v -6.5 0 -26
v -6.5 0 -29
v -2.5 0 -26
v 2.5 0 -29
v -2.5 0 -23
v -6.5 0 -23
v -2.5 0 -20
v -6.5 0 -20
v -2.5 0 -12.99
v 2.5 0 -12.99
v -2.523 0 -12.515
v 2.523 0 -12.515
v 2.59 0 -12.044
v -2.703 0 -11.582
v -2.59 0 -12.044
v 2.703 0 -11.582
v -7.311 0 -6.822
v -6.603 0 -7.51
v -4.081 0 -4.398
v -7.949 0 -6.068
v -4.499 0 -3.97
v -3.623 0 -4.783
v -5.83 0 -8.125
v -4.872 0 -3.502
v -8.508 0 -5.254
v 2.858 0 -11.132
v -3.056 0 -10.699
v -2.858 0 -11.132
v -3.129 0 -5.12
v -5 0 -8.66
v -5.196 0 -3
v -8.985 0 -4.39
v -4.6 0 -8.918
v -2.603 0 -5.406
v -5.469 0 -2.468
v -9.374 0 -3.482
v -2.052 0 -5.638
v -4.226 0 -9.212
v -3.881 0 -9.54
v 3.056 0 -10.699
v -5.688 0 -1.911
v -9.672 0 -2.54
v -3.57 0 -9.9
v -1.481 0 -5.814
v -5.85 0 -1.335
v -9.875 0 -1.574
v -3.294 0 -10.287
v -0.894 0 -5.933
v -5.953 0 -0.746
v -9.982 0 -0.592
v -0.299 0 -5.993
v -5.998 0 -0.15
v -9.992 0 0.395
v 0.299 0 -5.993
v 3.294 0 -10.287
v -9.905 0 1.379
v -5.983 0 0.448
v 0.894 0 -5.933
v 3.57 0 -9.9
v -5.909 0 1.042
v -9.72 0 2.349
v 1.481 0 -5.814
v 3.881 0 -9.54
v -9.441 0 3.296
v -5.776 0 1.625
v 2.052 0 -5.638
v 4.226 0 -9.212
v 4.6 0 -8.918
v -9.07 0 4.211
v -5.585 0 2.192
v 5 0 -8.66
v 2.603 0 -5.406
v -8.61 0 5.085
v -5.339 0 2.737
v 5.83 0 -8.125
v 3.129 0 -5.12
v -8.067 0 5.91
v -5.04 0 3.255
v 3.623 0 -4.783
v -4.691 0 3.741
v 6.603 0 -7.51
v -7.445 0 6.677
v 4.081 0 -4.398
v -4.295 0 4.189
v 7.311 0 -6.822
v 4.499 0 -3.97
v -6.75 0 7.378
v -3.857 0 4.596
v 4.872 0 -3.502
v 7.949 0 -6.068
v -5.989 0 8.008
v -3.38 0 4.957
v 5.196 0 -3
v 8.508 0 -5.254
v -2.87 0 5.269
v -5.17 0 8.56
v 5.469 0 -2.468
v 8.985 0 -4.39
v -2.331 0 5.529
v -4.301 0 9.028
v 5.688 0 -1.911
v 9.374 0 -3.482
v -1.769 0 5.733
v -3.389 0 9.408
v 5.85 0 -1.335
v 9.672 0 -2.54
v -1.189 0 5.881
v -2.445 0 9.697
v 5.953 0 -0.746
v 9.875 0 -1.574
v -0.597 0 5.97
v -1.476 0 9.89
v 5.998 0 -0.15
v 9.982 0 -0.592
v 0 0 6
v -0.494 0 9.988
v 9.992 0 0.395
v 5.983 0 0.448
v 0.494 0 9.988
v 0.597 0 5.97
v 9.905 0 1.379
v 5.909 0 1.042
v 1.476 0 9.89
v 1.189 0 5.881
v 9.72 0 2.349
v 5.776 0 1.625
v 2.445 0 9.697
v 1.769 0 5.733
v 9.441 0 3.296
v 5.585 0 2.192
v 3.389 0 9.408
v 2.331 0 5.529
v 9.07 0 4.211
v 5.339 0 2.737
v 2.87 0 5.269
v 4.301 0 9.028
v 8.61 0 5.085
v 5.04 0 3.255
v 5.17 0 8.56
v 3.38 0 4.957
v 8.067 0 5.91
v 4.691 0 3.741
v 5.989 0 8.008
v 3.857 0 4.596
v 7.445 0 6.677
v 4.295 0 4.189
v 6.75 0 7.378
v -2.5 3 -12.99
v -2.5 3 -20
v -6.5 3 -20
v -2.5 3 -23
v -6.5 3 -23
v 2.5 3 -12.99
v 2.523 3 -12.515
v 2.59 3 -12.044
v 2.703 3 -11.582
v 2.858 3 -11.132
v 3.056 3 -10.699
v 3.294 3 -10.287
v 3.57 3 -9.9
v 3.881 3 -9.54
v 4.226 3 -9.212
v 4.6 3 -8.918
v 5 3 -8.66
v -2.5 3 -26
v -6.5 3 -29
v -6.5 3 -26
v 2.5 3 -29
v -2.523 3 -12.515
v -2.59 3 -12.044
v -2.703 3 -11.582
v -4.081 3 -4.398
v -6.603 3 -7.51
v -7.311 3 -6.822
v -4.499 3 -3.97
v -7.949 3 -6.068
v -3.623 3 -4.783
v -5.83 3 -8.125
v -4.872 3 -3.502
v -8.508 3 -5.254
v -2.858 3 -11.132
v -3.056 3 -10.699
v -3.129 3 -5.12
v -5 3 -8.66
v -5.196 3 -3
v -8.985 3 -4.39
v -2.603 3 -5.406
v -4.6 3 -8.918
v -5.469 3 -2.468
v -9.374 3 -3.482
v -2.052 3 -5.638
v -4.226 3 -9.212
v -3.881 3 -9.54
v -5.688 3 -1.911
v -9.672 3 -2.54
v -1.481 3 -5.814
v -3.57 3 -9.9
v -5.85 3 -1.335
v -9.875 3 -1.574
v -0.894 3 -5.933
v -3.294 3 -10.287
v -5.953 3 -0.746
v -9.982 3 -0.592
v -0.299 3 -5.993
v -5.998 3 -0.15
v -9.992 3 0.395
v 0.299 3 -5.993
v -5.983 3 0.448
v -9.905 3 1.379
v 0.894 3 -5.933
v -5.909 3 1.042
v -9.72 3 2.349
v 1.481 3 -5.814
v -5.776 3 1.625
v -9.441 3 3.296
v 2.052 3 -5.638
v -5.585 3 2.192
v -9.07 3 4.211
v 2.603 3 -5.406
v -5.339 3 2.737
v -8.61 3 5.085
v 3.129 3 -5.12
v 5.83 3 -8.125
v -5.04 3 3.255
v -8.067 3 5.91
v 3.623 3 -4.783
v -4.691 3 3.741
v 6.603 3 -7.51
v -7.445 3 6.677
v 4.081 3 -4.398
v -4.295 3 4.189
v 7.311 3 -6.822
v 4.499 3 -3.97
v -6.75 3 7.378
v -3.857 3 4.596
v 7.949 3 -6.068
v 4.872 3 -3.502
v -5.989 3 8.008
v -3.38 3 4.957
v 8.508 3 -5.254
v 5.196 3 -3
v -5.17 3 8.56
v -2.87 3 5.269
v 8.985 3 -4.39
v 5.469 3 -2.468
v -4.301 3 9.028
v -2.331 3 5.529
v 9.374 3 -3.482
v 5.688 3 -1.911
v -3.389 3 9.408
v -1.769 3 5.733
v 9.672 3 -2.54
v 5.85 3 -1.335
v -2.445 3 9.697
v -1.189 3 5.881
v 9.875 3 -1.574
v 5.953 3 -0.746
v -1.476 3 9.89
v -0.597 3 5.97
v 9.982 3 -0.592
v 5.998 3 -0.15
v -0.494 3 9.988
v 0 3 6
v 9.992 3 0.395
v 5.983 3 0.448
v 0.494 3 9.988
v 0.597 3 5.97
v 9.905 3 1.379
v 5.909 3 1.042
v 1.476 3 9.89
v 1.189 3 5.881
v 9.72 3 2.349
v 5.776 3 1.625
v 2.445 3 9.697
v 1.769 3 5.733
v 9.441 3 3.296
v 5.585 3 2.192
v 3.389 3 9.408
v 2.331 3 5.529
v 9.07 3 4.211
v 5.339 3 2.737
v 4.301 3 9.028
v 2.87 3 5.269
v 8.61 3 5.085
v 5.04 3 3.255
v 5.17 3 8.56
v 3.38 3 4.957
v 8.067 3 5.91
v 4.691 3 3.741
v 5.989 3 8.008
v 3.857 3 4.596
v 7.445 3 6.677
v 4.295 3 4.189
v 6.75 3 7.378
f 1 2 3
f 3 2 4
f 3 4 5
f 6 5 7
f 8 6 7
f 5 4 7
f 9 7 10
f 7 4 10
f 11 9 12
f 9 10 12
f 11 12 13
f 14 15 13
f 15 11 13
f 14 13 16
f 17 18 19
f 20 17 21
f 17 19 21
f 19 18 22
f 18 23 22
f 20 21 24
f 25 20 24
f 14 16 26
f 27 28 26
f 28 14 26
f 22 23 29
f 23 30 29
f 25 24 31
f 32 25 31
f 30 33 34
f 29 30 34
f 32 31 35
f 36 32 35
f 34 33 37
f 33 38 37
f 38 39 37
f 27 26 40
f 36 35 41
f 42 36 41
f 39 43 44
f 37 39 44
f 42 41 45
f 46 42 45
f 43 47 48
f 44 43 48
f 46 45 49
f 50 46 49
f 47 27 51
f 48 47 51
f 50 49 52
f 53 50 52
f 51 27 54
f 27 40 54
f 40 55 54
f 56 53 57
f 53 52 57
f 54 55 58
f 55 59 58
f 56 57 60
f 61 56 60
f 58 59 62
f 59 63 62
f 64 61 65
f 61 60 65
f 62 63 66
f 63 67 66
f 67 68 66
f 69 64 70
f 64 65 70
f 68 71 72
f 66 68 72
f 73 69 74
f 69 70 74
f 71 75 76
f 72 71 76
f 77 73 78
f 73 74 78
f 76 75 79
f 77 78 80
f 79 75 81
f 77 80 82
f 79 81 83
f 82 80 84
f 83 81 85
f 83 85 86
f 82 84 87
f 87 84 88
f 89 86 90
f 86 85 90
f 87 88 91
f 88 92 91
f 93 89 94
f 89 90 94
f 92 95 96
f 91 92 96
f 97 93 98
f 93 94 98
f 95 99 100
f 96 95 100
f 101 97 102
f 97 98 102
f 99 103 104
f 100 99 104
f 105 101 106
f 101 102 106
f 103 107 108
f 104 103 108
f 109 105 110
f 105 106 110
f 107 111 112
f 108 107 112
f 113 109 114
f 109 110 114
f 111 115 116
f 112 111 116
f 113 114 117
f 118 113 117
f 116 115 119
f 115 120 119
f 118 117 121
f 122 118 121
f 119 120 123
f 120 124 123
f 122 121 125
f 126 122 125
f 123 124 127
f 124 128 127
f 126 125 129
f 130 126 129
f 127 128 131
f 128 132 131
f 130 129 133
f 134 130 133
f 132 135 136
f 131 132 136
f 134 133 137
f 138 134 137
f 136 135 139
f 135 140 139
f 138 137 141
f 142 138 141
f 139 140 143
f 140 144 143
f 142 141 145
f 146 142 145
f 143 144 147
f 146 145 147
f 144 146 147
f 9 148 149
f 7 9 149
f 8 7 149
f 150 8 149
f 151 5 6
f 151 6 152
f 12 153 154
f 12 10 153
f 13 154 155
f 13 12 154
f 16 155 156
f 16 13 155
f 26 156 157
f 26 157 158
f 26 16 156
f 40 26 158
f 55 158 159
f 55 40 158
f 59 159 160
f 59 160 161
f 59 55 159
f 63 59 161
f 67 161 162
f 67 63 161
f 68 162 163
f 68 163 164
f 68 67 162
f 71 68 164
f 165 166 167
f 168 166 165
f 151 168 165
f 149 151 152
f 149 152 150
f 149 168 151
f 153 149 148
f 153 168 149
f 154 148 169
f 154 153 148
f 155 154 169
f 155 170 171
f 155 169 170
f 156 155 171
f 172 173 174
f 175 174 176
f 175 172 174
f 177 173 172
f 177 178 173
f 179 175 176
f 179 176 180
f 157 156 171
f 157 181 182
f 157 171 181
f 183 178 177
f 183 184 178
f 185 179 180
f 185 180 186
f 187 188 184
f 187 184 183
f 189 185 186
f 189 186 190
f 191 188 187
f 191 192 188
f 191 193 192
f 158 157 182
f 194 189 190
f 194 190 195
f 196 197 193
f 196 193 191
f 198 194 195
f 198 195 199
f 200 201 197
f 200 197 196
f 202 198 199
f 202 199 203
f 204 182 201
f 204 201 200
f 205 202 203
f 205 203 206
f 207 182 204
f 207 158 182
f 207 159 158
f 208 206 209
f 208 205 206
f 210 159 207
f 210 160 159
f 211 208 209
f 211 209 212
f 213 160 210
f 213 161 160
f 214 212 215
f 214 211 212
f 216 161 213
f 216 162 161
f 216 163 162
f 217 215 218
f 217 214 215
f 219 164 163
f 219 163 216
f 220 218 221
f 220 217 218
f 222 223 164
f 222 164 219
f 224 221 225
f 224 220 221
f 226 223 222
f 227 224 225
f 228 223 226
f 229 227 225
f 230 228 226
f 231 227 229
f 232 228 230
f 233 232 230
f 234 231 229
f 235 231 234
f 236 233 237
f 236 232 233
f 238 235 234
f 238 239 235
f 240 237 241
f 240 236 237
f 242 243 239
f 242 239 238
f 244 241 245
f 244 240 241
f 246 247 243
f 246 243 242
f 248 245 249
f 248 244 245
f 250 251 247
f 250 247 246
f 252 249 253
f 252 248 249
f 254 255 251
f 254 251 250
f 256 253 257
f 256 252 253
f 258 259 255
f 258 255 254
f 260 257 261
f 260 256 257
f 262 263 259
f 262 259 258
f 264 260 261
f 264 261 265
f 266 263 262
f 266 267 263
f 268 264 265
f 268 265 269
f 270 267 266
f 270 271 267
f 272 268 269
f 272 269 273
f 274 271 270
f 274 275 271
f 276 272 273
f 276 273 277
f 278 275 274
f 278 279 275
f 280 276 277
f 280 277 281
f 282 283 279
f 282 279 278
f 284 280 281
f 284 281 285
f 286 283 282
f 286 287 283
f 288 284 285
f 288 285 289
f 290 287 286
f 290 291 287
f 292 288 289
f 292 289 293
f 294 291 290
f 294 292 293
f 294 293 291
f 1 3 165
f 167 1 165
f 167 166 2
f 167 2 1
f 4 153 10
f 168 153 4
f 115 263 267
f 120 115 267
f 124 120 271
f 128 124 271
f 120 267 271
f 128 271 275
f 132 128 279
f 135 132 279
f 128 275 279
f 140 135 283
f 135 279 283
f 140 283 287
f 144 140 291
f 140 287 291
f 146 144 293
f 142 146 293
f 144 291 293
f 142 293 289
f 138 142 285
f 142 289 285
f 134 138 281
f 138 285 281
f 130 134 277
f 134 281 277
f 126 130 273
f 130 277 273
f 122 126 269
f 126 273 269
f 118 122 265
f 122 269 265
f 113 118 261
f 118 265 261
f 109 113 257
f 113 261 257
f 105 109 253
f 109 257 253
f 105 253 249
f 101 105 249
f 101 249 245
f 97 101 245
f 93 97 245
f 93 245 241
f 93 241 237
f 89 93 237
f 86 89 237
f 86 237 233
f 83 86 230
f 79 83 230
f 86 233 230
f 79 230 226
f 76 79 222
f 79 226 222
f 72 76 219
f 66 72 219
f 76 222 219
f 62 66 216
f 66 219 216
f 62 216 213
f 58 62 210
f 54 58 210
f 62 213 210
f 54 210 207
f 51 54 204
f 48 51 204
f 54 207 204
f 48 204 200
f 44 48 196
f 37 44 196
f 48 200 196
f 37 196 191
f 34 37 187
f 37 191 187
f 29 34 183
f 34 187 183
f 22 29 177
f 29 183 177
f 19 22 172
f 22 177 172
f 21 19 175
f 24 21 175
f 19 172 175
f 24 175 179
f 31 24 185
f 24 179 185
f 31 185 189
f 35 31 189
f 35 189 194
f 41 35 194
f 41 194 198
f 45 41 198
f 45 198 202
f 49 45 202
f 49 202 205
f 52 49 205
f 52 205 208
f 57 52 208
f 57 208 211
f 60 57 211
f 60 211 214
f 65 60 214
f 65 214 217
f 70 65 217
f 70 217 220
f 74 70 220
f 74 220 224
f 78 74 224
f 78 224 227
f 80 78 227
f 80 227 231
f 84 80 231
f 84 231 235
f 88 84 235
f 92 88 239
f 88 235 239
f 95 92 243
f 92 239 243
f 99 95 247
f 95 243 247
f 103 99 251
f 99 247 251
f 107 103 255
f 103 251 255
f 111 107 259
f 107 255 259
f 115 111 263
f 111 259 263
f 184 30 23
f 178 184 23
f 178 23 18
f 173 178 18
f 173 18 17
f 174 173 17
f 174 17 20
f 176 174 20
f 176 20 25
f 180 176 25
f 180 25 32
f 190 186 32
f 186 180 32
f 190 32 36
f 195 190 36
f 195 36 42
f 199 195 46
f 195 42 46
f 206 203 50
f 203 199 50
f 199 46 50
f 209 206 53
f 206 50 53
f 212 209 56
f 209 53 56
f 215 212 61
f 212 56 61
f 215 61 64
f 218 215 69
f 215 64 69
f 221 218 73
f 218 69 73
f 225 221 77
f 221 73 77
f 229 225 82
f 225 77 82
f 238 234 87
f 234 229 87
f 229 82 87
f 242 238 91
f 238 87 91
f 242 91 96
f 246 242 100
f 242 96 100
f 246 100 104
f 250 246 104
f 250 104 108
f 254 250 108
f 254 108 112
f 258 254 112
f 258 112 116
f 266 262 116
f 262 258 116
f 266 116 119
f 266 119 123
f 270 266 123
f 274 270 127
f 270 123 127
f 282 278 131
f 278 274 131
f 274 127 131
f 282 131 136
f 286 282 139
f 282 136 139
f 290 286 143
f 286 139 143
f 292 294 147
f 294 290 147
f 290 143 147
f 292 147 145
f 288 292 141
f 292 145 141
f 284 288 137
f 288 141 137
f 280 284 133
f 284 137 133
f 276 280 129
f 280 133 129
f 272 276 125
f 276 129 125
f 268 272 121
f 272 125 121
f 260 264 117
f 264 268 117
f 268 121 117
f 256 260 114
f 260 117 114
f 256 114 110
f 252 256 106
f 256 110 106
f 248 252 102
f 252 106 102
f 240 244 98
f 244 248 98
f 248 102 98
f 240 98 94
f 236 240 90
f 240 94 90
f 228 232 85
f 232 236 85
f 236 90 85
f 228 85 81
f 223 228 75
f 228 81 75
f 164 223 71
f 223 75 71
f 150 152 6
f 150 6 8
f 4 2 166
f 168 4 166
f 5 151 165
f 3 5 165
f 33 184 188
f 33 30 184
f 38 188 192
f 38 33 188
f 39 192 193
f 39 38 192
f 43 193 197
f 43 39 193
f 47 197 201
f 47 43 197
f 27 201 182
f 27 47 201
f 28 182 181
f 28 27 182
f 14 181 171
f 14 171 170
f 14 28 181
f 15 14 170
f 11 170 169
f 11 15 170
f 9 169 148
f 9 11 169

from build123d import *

# Parameters (mm, degrees)
SKETCH1_R           = 10
BOSS_EXTRUDE1_DEPTH = 3
SKETCH2_W           = 5
SKETCH2_H           = 20
BOSS_EXTRUDE2_DEPTH = 3
SKETCH3_W           = 3
SKETCH3_H           = 3
BOSS_EXTRUDE3_DEPTH = 4
SKETCH4_R           = 6
CUT_EXTRUDE1_DEPTH  = 3
FILLET1_R           = 5


with BuildPart() as part:
    # Sketch1 → Boss-Extrude1 (new body)
    with BuildSketch(Plane(origin=(0, 0, 0), x_dir=(1, 0, 0), z_dir=(0, 1, 0))):
        with Locations(Location((0, 0, 0), (0, 0, 270))):
            Circle(SKETCH1_R)
    extrude(amount=BOSS_EXTRUDE1_DEPTH)

    # Sketch2 → Boss-Extrude2 (add)
    with BuildSketch(Plane(origin=(0, 3, 0), x_dir=(1, 0, 0), z_dir=(0, 1, 0))):
        with Locations((0, 19)):
            Rectangle(SKETCH2_W, SKETCH2_H)
    extrude(amount=-BOSS_EXTRUDE2_DEPTH)

    # Sketch3 → Boss-Extrude3 (add)
    with BuildSketch(Plane.ZY.offset(2.5)):
        with Locations((-27.5, 1.5)):
            Rectangle(SKETCH3_W, SKETCH3_H)
        with Locations((-21.5, 1.5)):
            Rectangle(SKETCH3_W, SKETCH3_H)
    extrude(amount=BOSS_EXTRUDE3_DEPTH)

    # Sketch4 → Cut-Extrude1 (cut)
    with BuildSketch(Plane(origin=(0, 3, 0), x_dir=(1, 0, 0), z_dir=(0, 1, 0))):
        with Locations(Location((0, 0, 0), (0, 0, 270))):
            Circle(SKETCH4_R)
    extrude(amount=-CUT_EXTRUDE1_DEPTH, mode=Mode.SUBTRACT)

    # Fillet1
    fillet1_edges = [part.edges().sort_by_distance(p)[0] for p in [
        (-2.5, 1.5, -9.682458366),
        (2.5, 1.5, -9.682458366),
    ]]
    fillet(fillet1_edges, radius=FILLET1_R)


solid = part.part
